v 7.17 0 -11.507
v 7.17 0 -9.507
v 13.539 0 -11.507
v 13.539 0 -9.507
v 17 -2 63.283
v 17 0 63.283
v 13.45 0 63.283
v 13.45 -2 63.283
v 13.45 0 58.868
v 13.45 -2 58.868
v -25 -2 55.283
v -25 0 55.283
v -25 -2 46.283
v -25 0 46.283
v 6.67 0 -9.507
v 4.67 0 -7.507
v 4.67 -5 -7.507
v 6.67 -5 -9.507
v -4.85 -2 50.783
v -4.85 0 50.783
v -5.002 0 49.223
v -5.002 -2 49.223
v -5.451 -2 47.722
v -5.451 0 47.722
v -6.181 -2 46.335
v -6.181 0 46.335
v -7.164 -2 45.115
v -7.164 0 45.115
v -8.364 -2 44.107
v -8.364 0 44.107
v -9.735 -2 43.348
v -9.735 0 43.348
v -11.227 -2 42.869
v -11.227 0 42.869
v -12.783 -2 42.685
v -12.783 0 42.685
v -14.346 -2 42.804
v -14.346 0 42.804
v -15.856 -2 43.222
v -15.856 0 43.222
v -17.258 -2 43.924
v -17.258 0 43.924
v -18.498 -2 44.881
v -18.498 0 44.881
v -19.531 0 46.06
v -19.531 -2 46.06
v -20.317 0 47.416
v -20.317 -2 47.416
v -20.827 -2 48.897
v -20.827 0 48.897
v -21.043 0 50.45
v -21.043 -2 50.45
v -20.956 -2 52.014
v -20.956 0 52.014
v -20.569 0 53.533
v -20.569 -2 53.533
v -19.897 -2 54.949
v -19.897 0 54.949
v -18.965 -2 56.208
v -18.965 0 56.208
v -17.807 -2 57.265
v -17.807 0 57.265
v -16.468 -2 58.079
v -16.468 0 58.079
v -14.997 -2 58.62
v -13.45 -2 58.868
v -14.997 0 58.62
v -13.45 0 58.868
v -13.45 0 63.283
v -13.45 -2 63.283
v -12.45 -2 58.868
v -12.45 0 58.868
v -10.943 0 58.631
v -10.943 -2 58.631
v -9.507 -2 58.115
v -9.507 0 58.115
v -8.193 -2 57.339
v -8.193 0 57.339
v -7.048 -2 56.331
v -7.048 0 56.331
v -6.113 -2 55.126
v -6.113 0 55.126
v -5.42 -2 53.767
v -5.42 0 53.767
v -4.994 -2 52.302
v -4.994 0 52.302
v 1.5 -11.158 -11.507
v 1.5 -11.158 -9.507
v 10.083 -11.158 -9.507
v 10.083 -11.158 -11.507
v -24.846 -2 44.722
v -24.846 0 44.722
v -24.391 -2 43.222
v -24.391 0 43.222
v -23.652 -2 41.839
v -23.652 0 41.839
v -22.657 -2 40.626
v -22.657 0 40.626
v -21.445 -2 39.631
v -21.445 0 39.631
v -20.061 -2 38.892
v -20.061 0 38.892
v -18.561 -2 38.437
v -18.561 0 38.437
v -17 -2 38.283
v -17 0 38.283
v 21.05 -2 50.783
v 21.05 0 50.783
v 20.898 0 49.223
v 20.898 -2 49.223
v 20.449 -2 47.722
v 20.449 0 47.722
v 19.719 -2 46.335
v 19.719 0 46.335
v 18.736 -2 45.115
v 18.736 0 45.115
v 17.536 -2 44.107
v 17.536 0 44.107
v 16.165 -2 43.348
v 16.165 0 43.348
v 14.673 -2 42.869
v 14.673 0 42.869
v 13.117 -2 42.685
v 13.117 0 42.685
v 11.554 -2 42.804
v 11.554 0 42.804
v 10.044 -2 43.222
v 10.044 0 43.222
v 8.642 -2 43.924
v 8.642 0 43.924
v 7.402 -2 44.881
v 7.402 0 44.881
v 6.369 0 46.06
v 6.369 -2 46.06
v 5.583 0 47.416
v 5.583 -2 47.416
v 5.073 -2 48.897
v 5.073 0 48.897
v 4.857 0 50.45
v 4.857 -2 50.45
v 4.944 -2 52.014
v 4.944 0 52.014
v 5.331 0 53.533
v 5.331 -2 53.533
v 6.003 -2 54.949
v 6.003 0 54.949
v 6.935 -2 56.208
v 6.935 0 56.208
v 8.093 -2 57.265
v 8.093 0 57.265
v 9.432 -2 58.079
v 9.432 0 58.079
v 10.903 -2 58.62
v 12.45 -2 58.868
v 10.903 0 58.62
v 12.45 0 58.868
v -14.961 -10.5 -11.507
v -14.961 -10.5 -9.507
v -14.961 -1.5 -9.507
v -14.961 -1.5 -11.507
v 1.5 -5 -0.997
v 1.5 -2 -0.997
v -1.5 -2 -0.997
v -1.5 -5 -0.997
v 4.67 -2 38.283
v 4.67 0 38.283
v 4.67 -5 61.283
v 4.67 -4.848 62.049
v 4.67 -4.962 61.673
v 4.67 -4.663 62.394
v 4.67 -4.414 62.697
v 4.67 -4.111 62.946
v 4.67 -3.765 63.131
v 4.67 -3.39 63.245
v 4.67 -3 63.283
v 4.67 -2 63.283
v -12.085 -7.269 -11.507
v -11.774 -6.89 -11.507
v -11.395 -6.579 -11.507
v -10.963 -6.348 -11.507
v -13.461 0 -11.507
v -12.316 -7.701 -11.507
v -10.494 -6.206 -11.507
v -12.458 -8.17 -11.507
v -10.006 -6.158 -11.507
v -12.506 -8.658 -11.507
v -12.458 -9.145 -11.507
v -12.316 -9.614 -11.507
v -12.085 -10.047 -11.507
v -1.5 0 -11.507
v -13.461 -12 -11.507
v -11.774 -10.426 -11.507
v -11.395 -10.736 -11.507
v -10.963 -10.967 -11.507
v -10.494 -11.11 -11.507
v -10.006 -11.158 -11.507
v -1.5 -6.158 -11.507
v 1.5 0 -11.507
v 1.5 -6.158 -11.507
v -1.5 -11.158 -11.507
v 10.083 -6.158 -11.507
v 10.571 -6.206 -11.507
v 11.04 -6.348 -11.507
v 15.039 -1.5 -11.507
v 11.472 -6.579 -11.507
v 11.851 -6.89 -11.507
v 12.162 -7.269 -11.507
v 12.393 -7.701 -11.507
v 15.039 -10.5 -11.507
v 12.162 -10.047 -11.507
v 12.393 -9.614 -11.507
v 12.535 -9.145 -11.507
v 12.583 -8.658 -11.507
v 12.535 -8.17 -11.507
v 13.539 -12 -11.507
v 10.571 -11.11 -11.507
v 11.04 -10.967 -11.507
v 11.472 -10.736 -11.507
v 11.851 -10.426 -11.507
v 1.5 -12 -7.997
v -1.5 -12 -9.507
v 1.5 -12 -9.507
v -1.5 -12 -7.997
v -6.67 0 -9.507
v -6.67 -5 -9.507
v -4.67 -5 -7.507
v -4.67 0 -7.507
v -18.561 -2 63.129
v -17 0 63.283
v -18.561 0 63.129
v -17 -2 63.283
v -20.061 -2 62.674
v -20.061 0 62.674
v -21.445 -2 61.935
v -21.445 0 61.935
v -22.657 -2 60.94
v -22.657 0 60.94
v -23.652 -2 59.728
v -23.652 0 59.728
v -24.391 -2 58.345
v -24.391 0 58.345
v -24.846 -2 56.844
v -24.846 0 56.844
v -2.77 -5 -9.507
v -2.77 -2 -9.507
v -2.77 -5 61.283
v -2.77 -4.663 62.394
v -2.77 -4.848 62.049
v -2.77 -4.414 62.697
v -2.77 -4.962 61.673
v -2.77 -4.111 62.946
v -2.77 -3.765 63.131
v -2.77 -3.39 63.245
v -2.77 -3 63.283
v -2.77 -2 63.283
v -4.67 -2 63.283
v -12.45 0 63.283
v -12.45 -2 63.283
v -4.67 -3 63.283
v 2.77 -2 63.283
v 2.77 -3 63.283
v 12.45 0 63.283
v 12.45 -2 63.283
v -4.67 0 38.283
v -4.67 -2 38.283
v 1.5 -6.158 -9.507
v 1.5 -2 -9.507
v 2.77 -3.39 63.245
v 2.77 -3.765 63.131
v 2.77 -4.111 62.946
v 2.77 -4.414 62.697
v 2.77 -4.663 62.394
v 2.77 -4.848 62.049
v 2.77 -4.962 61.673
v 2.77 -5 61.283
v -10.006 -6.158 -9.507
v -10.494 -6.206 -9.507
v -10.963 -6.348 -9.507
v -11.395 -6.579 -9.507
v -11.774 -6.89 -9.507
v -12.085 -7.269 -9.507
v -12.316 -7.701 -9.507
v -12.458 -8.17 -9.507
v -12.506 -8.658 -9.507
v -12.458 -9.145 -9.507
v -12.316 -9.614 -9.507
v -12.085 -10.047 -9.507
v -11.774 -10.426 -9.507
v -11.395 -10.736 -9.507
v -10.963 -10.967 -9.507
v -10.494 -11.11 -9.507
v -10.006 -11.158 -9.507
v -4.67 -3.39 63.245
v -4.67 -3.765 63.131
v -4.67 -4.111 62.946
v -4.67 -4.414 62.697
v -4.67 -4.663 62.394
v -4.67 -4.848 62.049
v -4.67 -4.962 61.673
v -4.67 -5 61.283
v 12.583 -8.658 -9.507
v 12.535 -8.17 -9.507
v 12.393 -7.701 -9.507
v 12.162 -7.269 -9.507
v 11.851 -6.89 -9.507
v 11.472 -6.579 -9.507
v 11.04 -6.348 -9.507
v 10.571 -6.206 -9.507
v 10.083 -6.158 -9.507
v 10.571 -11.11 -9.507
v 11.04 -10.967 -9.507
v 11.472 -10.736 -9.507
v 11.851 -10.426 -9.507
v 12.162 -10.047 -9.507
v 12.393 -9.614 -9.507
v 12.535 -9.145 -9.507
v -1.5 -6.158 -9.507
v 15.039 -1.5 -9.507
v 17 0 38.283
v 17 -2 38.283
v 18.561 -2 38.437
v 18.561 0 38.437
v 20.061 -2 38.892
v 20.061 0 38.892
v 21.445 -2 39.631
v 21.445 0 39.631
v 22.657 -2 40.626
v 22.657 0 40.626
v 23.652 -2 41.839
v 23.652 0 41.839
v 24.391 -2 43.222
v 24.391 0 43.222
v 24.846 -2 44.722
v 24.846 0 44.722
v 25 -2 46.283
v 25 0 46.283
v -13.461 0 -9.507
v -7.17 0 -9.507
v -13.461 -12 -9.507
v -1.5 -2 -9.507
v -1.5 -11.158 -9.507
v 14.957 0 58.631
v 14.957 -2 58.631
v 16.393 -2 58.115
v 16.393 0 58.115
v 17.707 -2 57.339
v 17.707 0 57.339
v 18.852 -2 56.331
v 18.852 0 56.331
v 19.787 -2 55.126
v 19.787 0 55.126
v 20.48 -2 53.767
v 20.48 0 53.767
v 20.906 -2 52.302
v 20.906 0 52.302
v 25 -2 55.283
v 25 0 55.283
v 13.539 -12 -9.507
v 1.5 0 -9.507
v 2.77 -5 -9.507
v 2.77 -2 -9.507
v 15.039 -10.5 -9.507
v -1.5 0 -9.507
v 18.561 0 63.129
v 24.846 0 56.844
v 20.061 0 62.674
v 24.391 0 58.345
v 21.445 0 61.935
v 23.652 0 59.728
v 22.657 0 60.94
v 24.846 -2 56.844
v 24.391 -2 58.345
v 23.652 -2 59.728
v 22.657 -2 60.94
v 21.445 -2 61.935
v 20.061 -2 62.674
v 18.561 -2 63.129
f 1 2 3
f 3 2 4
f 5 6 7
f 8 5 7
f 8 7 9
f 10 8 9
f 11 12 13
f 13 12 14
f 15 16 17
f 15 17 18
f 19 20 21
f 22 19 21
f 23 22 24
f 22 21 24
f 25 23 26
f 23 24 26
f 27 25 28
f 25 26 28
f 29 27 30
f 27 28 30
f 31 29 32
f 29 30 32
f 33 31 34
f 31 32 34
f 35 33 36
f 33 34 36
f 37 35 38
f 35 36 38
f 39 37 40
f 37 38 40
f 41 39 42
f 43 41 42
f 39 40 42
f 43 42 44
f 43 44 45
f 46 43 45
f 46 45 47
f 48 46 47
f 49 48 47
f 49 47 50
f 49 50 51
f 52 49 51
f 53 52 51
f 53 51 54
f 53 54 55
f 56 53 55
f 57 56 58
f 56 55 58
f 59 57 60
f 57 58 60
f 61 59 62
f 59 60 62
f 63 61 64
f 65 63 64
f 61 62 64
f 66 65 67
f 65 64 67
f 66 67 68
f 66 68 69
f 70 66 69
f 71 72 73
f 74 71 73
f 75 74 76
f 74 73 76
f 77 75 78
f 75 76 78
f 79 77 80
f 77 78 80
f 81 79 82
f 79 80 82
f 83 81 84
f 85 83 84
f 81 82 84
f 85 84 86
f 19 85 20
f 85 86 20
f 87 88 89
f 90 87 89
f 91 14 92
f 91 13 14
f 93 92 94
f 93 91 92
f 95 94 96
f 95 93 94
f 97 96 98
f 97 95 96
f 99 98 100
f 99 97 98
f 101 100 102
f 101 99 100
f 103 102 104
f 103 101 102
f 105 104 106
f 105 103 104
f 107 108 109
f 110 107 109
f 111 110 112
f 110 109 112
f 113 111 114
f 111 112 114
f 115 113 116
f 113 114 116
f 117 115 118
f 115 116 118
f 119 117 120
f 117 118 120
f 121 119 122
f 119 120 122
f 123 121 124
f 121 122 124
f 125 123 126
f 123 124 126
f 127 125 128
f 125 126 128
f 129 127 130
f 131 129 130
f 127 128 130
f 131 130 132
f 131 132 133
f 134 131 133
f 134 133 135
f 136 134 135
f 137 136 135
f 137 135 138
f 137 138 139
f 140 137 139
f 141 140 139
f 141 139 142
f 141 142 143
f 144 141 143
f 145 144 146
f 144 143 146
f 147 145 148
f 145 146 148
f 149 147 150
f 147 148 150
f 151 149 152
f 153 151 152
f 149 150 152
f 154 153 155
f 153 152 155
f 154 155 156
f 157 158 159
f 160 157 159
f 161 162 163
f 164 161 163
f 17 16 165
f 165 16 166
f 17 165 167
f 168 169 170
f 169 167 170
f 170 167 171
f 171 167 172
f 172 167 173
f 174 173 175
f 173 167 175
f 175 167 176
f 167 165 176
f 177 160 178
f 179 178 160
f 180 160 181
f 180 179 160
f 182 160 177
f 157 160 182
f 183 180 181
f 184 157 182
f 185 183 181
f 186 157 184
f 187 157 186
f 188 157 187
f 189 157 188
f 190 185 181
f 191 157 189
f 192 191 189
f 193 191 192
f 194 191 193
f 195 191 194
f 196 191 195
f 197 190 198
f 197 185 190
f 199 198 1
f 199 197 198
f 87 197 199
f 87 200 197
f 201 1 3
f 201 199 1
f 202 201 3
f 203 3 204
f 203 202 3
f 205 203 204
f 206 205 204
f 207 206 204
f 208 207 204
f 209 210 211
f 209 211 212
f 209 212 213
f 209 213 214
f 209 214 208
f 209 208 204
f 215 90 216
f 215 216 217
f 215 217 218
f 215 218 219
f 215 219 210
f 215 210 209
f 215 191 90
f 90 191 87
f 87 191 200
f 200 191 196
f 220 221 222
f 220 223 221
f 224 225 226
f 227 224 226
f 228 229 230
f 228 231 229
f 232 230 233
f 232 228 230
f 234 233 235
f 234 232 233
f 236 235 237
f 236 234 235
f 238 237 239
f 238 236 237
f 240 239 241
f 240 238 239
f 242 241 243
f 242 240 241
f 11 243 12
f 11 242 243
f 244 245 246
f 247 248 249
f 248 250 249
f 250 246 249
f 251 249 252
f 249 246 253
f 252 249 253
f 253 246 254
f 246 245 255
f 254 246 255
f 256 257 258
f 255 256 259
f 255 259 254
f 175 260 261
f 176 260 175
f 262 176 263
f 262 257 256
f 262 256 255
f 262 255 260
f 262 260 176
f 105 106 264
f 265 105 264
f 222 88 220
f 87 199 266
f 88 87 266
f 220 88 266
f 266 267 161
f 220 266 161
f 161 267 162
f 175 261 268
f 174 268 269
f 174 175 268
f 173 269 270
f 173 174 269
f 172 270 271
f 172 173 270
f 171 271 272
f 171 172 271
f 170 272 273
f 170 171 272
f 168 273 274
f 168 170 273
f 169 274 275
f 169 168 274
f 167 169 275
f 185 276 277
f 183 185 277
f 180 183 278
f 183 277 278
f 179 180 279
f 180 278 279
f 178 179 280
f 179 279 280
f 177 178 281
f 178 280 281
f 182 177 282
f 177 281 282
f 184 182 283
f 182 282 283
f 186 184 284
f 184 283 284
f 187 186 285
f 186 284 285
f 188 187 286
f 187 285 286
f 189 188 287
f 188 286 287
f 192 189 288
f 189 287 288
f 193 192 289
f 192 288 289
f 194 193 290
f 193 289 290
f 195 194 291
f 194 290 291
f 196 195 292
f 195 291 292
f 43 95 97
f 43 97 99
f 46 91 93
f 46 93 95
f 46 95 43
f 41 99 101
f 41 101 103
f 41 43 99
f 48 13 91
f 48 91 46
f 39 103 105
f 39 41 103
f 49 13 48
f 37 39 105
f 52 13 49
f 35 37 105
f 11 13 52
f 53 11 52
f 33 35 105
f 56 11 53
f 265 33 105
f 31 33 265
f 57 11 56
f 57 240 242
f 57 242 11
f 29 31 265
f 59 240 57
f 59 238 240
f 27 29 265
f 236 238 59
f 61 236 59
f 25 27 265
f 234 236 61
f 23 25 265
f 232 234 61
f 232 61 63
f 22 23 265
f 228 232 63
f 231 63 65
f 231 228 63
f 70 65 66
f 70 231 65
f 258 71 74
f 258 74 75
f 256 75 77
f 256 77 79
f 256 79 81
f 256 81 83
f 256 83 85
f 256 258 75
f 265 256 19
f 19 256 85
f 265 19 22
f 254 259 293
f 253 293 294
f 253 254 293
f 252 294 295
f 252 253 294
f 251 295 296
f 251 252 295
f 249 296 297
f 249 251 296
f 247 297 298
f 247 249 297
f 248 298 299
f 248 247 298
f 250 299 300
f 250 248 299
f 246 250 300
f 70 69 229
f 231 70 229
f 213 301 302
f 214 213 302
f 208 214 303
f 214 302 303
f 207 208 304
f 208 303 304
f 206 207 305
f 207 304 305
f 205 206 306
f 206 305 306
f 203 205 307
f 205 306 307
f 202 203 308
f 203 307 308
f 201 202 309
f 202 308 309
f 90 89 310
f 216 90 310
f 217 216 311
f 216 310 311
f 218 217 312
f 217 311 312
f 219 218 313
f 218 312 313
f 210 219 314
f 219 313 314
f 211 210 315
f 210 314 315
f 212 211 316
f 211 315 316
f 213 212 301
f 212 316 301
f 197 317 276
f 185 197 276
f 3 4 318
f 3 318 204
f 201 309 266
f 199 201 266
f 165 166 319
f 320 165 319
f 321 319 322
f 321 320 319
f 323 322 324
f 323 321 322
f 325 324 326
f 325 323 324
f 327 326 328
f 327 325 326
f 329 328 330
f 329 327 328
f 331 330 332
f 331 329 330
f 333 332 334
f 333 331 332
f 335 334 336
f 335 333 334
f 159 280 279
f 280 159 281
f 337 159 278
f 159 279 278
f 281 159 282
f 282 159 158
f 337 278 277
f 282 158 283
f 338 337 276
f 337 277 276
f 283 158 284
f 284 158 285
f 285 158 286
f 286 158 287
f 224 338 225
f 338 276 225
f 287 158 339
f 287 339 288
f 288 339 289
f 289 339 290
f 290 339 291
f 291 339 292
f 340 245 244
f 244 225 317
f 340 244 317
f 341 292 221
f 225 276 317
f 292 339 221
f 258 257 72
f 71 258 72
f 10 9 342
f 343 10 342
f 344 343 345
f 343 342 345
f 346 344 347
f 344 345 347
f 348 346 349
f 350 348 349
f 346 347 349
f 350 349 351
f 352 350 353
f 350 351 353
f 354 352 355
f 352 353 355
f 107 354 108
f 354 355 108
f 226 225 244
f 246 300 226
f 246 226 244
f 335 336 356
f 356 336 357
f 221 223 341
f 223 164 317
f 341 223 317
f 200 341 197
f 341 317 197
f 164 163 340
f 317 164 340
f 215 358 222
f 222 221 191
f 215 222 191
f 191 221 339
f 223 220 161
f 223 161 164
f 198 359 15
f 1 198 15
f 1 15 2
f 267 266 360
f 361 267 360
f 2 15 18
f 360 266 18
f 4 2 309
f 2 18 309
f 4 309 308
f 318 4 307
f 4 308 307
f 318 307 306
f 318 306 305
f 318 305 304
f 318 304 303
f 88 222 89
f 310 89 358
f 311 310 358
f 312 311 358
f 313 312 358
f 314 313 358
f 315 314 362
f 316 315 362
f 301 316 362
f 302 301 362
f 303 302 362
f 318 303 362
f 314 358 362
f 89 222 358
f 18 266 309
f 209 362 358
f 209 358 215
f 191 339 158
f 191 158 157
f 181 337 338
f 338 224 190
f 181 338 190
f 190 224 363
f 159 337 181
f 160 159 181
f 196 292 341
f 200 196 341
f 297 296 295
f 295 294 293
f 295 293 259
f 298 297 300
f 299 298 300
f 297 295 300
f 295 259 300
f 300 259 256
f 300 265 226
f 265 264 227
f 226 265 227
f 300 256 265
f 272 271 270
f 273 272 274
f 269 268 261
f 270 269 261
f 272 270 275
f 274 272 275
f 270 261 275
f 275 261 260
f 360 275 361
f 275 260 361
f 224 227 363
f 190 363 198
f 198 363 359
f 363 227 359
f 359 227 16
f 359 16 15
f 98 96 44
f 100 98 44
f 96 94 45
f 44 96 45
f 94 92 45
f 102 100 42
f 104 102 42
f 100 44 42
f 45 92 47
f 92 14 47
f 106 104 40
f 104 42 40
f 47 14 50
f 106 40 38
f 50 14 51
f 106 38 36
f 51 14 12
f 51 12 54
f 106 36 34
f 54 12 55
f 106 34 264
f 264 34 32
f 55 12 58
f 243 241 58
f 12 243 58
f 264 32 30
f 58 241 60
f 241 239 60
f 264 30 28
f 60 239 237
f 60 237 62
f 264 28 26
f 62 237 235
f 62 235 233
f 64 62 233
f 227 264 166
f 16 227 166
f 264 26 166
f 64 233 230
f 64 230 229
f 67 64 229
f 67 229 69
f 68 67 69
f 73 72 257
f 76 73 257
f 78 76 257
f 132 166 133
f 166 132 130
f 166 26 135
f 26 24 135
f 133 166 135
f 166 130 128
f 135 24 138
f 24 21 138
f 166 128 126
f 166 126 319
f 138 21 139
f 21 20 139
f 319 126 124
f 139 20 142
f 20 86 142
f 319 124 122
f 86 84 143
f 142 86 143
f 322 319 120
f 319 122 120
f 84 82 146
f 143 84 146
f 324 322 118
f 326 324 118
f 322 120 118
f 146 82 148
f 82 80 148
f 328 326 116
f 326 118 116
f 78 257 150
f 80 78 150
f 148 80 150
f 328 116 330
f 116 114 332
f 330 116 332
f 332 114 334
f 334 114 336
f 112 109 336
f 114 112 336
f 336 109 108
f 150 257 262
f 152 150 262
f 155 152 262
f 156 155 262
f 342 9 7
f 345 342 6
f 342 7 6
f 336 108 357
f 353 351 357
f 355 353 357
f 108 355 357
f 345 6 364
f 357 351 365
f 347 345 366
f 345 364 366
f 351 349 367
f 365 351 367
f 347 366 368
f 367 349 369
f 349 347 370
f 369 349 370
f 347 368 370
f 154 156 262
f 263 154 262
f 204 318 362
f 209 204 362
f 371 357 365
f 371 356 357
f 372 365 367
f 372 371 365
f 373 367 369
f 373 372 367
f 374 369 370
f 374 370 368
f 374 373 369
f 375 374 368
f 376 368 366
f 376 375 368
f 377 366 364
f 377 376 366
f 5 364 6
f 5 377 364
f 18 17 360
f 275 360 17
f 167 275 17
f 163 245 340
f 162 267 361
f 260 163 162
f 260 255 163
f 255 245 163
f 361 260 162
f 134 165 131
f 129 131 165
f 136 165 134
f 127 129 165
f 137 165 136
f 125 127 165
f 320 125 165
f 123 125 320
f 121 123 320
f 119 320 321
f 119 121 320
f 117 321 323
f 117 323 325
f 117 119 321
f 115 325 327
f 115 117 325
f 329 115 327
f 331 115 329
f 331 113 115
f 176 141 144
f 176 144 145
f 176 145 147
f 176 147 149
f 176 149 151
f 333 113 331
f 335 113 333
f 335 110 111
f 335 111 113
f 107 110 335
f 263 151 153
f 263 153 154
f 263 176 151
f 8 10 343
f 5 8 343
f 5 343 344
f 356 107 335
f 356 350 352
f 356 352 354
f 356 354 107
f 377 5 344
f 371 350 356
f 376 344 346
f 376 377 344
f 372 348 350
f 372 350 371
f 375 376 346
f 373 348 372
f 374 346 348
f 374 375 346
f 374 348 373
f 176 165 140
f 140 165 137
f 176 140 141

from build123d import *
from build123d import SkipClean  # not in build123d's __all__

# Parameters (mm, degrees)
F1_DEPTH      = 2
F0_W          = 5.54
F0_H          = 25
F0_W_2        = 1.9
F0_W_3        = 2.5
F0_H_2        = 2.5
F2_DEPTH      = 5
F3_DEPTH      = 5
F4_DEPTH      = 7
F5_SIZE       = 7
F8_DEPTH      = 2
F9_SIZE       = 1.5
F10_SIZE      = 1.5
F11_SIZE      = 1.5
F12_R         = 8
F13_R         = 2
F14_T4_DEPTH  = 20.4300979278
F14_T10_DEPTH = 20.4300979278


# Not quite as in the source:
# - a fillet or chamfer that OpenCascade refuses, or shapes differently, is made with other operations: its cross-section is extruded or revolved along the edge and cut away or added
# - ends of sketch curves that miss each other by under 0.0002 mm in the source are joined
# - a feature names something its author has since deleted; it is built from what else it names


with BuildPart() as f1:
    # F0 (on Front) → F1 (new body)
    with BuildSketch(Plane.XZ):
        with BuildLine():
            Line((-25, 38.2831491688), (-4.67, 38.2831491688))
            Line((-4.67, 38.2831491688), (-4.67, 63.2831491688))
            Line((-4.67, 63.2831491688), (-12.45, 63.2831491688))
            Line((-12.45, 63.2831491688), (-12.45, 58.8677023414))
            ThreePointArc((-12.45, 58.8677023414), (-7.0483053281, 56.3311217715), (-4.85, 50.7831491688))
            ThreePointArc((-4.85, 50.7831491688), (-18.4979726027, 44.8814544969), (-13.45, 58.8677023414))
            Line((-13.45, 58.8677023414), (-13.45, 63.2831491688))
            Line((-13.45, 63.2831491688), (-25, 63.2831491688))
            Line((-25, 63.2831491688), (-25, 38.2831491688))
        make_face()
    extrude(amount=F1_DEPTH)



with BuildPart() as f1b:
    # F0 (on Front) → F1, piece 2 (new body)
    with BuildSketch(Plane.XZ):
        with BuildLine():
            Line((4.67, 38.2831491688), (25, 38.2831491688))
            Line((25, 38.2831491688), (25, 63.2831491688))
            Line((25, 63.2831491688), (13.45, 63.2831491688))
            Line((13.45, 63.2831491688), (13.45, 58.8677023414))
            ThreePointArc((13.45, 58.8677023414), (18.8516946719, 56.3311217715), (21.05, 50.7831491688))
            ThreePointArc((21.05, 50.7831491688), (7.4020273973, 44.8814544969), (12.45, 58.8677023414))
            Line((12.45, 58.8677023414), (12.45, 63.2831491688))
            Line((12.45, 63.2831491688), (4.67, 63.2831491688))
            Line((4.67, 63.2831491688), (4.67, 38.2831491688))
        make_face()
    extrude(amount=F1_DEPTH)


with BuildPart() as f1c:
    # F0 (on Front) → F1, piece 3 (new body)
    with BuildSketch(Plane.XZ):
        with Locations((0, 50.7831491688)):
            Rectangle(F0_W, F0_H)
        Polygon((2.77, -9.5068508312), (2.77, 38.2831491688), (-2.77, 38.2831491688), (-2.77, -9.5068508312), (-1.5, -9.5068508312), (-1.5, -0.9968508312), (1.5, -0.9968508312), (1.5, -9.5068508312), align=None)
    extrude(amount=F1_DEPTH)


with BuildPart() as f1_1:
    add(f1.part, clean=False)

    add(f1b.part)  # F2 merges F1b

    add(f1c.part)  # F2 merges F1c
    # F0 (on Front) → F2 (join)
    with BuildSketch(Plane.XZ):
        Polygon((-2.77, -9.5068508312), (-2.77, 38.2831491688), (-4.67, 38.2831491688), (-4.67, 0), (-4.67, -7.0068508312), (-4.67, -9.5068508312), align=None)
        Polygon((4.67, -7.0068508312), (4.67, 38.2831491688), (2.77, 38.2831491688), (2.77, -9.5068508312), (4.67, -9.5068508312), align=None)
        with Locations((3.72, 50.7831491688)):
            Rectangle(F0_W_2, F0_H)
        with Locations((-3.72, 50.7831491688)):
            Rectangle(F0_W_2, F0_H)
        with Locations((-5.92, -8.2568508312)):
            Rectangle(F0_W_3, F0_H_2)
        with Locations((5.92, -8.2568508312)):
            Rectangle(F0_W_3, F0_H_2)
    extrude(amount=F2_DEPTH)

    # F0 (on Front) → F3 (join)
    with BuildSketch(Plane.XZ):
        Polygon((1.5, -11.5068508312), (1.5, -9.5068508312), (1.5, -0.9968508312), (-1.5, -0.9968508312), (-1.5, -9.5068508312), (-1.5, -11.5068508312), align=None)
    extrude(amount=F3_DEPTH)

    # F4 (add): a face of the model
    f4_faces = [f1_1.faces().sort_by_distance(p)[0] for p in [
        (0, -5, -6.2518508312),
    ]]
    extrude(f4_faces, amount=F4_DEPTH)

    # F5
    f5_edges = [f1_1.edges().sort_by_distance(p)[0] for p in [
        (0, -12, -0.996851),
    ]]
    chamfer(f5_edges, length=F5_SIZE)

    # F7 (on face) → F8 (join)
    with BuildSketch(Plane(origin=(0, 0, -9.5068508312), x_dir=(1, 0, 0), z_dir=(0, 0, -1))):
        Polygon((15.0385206658, 12.000000352), (0.0385206658, 12.000000352), (-14.9614793342, 12.000000352), (-14.9614793342, 3.52e-07), (1.5, 3.52e-07), (1.5, 2), (2.77, 2), (2.77, 5), (7.17, 5), (7.17, 0), (15.0385206658, 3.52e-07), align=None)
        with BuildLine():
            ThreePointArc((-10.0064205471, 6.1577448677), (-12.5064205471, 8.6577448677), (-10.0064205471, 11.1577448677))
            Line((-10.0064205471, 11.1577448677), (10.0834618788, 11.1577448677))
            ThreePointArc((10.0834618788, 11.1577448677), (11.8512288318, 10.4255118207), (12.5834618788, 8.6577448677))
            ThreePointArc((12.5834618788, 8.6577448677), (11.8512288318, 6.8899779148), (10.0834618788, 6.1577448677))
            Line((10.0834618788, 6.1577448677), (-10.0064205471, 6.1577448677))
        make_face(mode=Mode.SUBTRACT)
        Polygon((1.5, 2), (1.5, 0), (7.17, 3.52e-07), (7.17, 5), (2.77, 5), (2.77, 2), align=None)
    with SkipClean():  # cleaning this boolean's faces spoils the solid; the shape is the same uncleaned
        extrude(amount=F8_DEPTH)

    # F9
    f9_edges = [f1_1.edges().sort_by_distance(p)[0] for p in [
        (15.038521, -12, -10.506851),
    ]]
    chamfer(f9_edges, length=F9_SIZE)

    # F10
    f10_edges = [f1_1.edges().sort_by_distance(p)[0] for p in [
        (-14.961479, -12, -10.506851),
    ]]
    chamfer(f10_edges, length=F10_SIZE)

    # F11
    f11_edges = [f1_1.edges().sort_by_distance(p)[0] for p in [
        (-14.961479, 0, -10.506851),
        (15.038521, 0, -10.506851),
    ]]
    chamfer(f11_edges, length=F11_SIZE)

    # F12
    f12_edges = [f1_1.edges().sort_by_distance(p)[0] for p in [
        (25, -1, 38.283149),
        (-25, -1, 38.283149),
        (-25, -1, 63.283149),
        (25, -1, 63.283149),
    ]]
    fillet(f12_edges, radius=F12_R)

    # F13
    f13_edges = [f1_1.edges().sort_by_distance(p)[0] for p in [
        (3.72, -5, 63.283149),
        (-3.72, -5, 63.283149),
    ]]
    fillet(f13_edges, radius=F13_R)

    # F14: chamfer of 3 on 2 edges, made by hand


with BuildPart() as f14_tool2:
    # F14_s3 → F14_t4 (new body)
    with BuildSketch(Plane.XZ.offset(-7.7150489639)):
        Polygon((4.17, -7.0068508312), (7.17, -10.0068508312), (7.17, -7.0068508312), align=None)
    extrude(amount=F14_T4_DEPTH)

    split(bisect_by=Plane.YZ.offset(4.67), keep=Keep.TOP)

    split(bisect_by=Plane.XY.offset(-9.5068508312), keep=Keep.TOP)


with BuildPart() as f1_2:
    add(f1_1.part, clean=False)

    # F14_t1: cut F14_tool2
    add(f14_tool2.part, mode=Mode.SUBTRACT)


with BuildPart() as f14_tool8:
    # F14_s9 → F14_t10 (new body)
    with BuildSketch(Plane.XZ.offset(-7.7150489639)):
        Polygon((-7.17, -10.0068508312), (-4.17, -7.0068508312), (-7.17, -7.0068508312), align=None)
    extrude(amount=F14_T10_DEPTH)

    split(bisect_by=Plane.YZ.offset(-4.67), keep=Keep.BOTTOM)

    split(bisect_by=Plane.XY.offset(-9.5068508312), keep=Keep.TOP)


with BuildPart() as f1_3:
    add(f1_2.part, clean=False)

    # F14_t7: cut F14_tool8
    add(f14_tool8.part, mode=Mode.SUBTRACT)


solid = f1_3.part
